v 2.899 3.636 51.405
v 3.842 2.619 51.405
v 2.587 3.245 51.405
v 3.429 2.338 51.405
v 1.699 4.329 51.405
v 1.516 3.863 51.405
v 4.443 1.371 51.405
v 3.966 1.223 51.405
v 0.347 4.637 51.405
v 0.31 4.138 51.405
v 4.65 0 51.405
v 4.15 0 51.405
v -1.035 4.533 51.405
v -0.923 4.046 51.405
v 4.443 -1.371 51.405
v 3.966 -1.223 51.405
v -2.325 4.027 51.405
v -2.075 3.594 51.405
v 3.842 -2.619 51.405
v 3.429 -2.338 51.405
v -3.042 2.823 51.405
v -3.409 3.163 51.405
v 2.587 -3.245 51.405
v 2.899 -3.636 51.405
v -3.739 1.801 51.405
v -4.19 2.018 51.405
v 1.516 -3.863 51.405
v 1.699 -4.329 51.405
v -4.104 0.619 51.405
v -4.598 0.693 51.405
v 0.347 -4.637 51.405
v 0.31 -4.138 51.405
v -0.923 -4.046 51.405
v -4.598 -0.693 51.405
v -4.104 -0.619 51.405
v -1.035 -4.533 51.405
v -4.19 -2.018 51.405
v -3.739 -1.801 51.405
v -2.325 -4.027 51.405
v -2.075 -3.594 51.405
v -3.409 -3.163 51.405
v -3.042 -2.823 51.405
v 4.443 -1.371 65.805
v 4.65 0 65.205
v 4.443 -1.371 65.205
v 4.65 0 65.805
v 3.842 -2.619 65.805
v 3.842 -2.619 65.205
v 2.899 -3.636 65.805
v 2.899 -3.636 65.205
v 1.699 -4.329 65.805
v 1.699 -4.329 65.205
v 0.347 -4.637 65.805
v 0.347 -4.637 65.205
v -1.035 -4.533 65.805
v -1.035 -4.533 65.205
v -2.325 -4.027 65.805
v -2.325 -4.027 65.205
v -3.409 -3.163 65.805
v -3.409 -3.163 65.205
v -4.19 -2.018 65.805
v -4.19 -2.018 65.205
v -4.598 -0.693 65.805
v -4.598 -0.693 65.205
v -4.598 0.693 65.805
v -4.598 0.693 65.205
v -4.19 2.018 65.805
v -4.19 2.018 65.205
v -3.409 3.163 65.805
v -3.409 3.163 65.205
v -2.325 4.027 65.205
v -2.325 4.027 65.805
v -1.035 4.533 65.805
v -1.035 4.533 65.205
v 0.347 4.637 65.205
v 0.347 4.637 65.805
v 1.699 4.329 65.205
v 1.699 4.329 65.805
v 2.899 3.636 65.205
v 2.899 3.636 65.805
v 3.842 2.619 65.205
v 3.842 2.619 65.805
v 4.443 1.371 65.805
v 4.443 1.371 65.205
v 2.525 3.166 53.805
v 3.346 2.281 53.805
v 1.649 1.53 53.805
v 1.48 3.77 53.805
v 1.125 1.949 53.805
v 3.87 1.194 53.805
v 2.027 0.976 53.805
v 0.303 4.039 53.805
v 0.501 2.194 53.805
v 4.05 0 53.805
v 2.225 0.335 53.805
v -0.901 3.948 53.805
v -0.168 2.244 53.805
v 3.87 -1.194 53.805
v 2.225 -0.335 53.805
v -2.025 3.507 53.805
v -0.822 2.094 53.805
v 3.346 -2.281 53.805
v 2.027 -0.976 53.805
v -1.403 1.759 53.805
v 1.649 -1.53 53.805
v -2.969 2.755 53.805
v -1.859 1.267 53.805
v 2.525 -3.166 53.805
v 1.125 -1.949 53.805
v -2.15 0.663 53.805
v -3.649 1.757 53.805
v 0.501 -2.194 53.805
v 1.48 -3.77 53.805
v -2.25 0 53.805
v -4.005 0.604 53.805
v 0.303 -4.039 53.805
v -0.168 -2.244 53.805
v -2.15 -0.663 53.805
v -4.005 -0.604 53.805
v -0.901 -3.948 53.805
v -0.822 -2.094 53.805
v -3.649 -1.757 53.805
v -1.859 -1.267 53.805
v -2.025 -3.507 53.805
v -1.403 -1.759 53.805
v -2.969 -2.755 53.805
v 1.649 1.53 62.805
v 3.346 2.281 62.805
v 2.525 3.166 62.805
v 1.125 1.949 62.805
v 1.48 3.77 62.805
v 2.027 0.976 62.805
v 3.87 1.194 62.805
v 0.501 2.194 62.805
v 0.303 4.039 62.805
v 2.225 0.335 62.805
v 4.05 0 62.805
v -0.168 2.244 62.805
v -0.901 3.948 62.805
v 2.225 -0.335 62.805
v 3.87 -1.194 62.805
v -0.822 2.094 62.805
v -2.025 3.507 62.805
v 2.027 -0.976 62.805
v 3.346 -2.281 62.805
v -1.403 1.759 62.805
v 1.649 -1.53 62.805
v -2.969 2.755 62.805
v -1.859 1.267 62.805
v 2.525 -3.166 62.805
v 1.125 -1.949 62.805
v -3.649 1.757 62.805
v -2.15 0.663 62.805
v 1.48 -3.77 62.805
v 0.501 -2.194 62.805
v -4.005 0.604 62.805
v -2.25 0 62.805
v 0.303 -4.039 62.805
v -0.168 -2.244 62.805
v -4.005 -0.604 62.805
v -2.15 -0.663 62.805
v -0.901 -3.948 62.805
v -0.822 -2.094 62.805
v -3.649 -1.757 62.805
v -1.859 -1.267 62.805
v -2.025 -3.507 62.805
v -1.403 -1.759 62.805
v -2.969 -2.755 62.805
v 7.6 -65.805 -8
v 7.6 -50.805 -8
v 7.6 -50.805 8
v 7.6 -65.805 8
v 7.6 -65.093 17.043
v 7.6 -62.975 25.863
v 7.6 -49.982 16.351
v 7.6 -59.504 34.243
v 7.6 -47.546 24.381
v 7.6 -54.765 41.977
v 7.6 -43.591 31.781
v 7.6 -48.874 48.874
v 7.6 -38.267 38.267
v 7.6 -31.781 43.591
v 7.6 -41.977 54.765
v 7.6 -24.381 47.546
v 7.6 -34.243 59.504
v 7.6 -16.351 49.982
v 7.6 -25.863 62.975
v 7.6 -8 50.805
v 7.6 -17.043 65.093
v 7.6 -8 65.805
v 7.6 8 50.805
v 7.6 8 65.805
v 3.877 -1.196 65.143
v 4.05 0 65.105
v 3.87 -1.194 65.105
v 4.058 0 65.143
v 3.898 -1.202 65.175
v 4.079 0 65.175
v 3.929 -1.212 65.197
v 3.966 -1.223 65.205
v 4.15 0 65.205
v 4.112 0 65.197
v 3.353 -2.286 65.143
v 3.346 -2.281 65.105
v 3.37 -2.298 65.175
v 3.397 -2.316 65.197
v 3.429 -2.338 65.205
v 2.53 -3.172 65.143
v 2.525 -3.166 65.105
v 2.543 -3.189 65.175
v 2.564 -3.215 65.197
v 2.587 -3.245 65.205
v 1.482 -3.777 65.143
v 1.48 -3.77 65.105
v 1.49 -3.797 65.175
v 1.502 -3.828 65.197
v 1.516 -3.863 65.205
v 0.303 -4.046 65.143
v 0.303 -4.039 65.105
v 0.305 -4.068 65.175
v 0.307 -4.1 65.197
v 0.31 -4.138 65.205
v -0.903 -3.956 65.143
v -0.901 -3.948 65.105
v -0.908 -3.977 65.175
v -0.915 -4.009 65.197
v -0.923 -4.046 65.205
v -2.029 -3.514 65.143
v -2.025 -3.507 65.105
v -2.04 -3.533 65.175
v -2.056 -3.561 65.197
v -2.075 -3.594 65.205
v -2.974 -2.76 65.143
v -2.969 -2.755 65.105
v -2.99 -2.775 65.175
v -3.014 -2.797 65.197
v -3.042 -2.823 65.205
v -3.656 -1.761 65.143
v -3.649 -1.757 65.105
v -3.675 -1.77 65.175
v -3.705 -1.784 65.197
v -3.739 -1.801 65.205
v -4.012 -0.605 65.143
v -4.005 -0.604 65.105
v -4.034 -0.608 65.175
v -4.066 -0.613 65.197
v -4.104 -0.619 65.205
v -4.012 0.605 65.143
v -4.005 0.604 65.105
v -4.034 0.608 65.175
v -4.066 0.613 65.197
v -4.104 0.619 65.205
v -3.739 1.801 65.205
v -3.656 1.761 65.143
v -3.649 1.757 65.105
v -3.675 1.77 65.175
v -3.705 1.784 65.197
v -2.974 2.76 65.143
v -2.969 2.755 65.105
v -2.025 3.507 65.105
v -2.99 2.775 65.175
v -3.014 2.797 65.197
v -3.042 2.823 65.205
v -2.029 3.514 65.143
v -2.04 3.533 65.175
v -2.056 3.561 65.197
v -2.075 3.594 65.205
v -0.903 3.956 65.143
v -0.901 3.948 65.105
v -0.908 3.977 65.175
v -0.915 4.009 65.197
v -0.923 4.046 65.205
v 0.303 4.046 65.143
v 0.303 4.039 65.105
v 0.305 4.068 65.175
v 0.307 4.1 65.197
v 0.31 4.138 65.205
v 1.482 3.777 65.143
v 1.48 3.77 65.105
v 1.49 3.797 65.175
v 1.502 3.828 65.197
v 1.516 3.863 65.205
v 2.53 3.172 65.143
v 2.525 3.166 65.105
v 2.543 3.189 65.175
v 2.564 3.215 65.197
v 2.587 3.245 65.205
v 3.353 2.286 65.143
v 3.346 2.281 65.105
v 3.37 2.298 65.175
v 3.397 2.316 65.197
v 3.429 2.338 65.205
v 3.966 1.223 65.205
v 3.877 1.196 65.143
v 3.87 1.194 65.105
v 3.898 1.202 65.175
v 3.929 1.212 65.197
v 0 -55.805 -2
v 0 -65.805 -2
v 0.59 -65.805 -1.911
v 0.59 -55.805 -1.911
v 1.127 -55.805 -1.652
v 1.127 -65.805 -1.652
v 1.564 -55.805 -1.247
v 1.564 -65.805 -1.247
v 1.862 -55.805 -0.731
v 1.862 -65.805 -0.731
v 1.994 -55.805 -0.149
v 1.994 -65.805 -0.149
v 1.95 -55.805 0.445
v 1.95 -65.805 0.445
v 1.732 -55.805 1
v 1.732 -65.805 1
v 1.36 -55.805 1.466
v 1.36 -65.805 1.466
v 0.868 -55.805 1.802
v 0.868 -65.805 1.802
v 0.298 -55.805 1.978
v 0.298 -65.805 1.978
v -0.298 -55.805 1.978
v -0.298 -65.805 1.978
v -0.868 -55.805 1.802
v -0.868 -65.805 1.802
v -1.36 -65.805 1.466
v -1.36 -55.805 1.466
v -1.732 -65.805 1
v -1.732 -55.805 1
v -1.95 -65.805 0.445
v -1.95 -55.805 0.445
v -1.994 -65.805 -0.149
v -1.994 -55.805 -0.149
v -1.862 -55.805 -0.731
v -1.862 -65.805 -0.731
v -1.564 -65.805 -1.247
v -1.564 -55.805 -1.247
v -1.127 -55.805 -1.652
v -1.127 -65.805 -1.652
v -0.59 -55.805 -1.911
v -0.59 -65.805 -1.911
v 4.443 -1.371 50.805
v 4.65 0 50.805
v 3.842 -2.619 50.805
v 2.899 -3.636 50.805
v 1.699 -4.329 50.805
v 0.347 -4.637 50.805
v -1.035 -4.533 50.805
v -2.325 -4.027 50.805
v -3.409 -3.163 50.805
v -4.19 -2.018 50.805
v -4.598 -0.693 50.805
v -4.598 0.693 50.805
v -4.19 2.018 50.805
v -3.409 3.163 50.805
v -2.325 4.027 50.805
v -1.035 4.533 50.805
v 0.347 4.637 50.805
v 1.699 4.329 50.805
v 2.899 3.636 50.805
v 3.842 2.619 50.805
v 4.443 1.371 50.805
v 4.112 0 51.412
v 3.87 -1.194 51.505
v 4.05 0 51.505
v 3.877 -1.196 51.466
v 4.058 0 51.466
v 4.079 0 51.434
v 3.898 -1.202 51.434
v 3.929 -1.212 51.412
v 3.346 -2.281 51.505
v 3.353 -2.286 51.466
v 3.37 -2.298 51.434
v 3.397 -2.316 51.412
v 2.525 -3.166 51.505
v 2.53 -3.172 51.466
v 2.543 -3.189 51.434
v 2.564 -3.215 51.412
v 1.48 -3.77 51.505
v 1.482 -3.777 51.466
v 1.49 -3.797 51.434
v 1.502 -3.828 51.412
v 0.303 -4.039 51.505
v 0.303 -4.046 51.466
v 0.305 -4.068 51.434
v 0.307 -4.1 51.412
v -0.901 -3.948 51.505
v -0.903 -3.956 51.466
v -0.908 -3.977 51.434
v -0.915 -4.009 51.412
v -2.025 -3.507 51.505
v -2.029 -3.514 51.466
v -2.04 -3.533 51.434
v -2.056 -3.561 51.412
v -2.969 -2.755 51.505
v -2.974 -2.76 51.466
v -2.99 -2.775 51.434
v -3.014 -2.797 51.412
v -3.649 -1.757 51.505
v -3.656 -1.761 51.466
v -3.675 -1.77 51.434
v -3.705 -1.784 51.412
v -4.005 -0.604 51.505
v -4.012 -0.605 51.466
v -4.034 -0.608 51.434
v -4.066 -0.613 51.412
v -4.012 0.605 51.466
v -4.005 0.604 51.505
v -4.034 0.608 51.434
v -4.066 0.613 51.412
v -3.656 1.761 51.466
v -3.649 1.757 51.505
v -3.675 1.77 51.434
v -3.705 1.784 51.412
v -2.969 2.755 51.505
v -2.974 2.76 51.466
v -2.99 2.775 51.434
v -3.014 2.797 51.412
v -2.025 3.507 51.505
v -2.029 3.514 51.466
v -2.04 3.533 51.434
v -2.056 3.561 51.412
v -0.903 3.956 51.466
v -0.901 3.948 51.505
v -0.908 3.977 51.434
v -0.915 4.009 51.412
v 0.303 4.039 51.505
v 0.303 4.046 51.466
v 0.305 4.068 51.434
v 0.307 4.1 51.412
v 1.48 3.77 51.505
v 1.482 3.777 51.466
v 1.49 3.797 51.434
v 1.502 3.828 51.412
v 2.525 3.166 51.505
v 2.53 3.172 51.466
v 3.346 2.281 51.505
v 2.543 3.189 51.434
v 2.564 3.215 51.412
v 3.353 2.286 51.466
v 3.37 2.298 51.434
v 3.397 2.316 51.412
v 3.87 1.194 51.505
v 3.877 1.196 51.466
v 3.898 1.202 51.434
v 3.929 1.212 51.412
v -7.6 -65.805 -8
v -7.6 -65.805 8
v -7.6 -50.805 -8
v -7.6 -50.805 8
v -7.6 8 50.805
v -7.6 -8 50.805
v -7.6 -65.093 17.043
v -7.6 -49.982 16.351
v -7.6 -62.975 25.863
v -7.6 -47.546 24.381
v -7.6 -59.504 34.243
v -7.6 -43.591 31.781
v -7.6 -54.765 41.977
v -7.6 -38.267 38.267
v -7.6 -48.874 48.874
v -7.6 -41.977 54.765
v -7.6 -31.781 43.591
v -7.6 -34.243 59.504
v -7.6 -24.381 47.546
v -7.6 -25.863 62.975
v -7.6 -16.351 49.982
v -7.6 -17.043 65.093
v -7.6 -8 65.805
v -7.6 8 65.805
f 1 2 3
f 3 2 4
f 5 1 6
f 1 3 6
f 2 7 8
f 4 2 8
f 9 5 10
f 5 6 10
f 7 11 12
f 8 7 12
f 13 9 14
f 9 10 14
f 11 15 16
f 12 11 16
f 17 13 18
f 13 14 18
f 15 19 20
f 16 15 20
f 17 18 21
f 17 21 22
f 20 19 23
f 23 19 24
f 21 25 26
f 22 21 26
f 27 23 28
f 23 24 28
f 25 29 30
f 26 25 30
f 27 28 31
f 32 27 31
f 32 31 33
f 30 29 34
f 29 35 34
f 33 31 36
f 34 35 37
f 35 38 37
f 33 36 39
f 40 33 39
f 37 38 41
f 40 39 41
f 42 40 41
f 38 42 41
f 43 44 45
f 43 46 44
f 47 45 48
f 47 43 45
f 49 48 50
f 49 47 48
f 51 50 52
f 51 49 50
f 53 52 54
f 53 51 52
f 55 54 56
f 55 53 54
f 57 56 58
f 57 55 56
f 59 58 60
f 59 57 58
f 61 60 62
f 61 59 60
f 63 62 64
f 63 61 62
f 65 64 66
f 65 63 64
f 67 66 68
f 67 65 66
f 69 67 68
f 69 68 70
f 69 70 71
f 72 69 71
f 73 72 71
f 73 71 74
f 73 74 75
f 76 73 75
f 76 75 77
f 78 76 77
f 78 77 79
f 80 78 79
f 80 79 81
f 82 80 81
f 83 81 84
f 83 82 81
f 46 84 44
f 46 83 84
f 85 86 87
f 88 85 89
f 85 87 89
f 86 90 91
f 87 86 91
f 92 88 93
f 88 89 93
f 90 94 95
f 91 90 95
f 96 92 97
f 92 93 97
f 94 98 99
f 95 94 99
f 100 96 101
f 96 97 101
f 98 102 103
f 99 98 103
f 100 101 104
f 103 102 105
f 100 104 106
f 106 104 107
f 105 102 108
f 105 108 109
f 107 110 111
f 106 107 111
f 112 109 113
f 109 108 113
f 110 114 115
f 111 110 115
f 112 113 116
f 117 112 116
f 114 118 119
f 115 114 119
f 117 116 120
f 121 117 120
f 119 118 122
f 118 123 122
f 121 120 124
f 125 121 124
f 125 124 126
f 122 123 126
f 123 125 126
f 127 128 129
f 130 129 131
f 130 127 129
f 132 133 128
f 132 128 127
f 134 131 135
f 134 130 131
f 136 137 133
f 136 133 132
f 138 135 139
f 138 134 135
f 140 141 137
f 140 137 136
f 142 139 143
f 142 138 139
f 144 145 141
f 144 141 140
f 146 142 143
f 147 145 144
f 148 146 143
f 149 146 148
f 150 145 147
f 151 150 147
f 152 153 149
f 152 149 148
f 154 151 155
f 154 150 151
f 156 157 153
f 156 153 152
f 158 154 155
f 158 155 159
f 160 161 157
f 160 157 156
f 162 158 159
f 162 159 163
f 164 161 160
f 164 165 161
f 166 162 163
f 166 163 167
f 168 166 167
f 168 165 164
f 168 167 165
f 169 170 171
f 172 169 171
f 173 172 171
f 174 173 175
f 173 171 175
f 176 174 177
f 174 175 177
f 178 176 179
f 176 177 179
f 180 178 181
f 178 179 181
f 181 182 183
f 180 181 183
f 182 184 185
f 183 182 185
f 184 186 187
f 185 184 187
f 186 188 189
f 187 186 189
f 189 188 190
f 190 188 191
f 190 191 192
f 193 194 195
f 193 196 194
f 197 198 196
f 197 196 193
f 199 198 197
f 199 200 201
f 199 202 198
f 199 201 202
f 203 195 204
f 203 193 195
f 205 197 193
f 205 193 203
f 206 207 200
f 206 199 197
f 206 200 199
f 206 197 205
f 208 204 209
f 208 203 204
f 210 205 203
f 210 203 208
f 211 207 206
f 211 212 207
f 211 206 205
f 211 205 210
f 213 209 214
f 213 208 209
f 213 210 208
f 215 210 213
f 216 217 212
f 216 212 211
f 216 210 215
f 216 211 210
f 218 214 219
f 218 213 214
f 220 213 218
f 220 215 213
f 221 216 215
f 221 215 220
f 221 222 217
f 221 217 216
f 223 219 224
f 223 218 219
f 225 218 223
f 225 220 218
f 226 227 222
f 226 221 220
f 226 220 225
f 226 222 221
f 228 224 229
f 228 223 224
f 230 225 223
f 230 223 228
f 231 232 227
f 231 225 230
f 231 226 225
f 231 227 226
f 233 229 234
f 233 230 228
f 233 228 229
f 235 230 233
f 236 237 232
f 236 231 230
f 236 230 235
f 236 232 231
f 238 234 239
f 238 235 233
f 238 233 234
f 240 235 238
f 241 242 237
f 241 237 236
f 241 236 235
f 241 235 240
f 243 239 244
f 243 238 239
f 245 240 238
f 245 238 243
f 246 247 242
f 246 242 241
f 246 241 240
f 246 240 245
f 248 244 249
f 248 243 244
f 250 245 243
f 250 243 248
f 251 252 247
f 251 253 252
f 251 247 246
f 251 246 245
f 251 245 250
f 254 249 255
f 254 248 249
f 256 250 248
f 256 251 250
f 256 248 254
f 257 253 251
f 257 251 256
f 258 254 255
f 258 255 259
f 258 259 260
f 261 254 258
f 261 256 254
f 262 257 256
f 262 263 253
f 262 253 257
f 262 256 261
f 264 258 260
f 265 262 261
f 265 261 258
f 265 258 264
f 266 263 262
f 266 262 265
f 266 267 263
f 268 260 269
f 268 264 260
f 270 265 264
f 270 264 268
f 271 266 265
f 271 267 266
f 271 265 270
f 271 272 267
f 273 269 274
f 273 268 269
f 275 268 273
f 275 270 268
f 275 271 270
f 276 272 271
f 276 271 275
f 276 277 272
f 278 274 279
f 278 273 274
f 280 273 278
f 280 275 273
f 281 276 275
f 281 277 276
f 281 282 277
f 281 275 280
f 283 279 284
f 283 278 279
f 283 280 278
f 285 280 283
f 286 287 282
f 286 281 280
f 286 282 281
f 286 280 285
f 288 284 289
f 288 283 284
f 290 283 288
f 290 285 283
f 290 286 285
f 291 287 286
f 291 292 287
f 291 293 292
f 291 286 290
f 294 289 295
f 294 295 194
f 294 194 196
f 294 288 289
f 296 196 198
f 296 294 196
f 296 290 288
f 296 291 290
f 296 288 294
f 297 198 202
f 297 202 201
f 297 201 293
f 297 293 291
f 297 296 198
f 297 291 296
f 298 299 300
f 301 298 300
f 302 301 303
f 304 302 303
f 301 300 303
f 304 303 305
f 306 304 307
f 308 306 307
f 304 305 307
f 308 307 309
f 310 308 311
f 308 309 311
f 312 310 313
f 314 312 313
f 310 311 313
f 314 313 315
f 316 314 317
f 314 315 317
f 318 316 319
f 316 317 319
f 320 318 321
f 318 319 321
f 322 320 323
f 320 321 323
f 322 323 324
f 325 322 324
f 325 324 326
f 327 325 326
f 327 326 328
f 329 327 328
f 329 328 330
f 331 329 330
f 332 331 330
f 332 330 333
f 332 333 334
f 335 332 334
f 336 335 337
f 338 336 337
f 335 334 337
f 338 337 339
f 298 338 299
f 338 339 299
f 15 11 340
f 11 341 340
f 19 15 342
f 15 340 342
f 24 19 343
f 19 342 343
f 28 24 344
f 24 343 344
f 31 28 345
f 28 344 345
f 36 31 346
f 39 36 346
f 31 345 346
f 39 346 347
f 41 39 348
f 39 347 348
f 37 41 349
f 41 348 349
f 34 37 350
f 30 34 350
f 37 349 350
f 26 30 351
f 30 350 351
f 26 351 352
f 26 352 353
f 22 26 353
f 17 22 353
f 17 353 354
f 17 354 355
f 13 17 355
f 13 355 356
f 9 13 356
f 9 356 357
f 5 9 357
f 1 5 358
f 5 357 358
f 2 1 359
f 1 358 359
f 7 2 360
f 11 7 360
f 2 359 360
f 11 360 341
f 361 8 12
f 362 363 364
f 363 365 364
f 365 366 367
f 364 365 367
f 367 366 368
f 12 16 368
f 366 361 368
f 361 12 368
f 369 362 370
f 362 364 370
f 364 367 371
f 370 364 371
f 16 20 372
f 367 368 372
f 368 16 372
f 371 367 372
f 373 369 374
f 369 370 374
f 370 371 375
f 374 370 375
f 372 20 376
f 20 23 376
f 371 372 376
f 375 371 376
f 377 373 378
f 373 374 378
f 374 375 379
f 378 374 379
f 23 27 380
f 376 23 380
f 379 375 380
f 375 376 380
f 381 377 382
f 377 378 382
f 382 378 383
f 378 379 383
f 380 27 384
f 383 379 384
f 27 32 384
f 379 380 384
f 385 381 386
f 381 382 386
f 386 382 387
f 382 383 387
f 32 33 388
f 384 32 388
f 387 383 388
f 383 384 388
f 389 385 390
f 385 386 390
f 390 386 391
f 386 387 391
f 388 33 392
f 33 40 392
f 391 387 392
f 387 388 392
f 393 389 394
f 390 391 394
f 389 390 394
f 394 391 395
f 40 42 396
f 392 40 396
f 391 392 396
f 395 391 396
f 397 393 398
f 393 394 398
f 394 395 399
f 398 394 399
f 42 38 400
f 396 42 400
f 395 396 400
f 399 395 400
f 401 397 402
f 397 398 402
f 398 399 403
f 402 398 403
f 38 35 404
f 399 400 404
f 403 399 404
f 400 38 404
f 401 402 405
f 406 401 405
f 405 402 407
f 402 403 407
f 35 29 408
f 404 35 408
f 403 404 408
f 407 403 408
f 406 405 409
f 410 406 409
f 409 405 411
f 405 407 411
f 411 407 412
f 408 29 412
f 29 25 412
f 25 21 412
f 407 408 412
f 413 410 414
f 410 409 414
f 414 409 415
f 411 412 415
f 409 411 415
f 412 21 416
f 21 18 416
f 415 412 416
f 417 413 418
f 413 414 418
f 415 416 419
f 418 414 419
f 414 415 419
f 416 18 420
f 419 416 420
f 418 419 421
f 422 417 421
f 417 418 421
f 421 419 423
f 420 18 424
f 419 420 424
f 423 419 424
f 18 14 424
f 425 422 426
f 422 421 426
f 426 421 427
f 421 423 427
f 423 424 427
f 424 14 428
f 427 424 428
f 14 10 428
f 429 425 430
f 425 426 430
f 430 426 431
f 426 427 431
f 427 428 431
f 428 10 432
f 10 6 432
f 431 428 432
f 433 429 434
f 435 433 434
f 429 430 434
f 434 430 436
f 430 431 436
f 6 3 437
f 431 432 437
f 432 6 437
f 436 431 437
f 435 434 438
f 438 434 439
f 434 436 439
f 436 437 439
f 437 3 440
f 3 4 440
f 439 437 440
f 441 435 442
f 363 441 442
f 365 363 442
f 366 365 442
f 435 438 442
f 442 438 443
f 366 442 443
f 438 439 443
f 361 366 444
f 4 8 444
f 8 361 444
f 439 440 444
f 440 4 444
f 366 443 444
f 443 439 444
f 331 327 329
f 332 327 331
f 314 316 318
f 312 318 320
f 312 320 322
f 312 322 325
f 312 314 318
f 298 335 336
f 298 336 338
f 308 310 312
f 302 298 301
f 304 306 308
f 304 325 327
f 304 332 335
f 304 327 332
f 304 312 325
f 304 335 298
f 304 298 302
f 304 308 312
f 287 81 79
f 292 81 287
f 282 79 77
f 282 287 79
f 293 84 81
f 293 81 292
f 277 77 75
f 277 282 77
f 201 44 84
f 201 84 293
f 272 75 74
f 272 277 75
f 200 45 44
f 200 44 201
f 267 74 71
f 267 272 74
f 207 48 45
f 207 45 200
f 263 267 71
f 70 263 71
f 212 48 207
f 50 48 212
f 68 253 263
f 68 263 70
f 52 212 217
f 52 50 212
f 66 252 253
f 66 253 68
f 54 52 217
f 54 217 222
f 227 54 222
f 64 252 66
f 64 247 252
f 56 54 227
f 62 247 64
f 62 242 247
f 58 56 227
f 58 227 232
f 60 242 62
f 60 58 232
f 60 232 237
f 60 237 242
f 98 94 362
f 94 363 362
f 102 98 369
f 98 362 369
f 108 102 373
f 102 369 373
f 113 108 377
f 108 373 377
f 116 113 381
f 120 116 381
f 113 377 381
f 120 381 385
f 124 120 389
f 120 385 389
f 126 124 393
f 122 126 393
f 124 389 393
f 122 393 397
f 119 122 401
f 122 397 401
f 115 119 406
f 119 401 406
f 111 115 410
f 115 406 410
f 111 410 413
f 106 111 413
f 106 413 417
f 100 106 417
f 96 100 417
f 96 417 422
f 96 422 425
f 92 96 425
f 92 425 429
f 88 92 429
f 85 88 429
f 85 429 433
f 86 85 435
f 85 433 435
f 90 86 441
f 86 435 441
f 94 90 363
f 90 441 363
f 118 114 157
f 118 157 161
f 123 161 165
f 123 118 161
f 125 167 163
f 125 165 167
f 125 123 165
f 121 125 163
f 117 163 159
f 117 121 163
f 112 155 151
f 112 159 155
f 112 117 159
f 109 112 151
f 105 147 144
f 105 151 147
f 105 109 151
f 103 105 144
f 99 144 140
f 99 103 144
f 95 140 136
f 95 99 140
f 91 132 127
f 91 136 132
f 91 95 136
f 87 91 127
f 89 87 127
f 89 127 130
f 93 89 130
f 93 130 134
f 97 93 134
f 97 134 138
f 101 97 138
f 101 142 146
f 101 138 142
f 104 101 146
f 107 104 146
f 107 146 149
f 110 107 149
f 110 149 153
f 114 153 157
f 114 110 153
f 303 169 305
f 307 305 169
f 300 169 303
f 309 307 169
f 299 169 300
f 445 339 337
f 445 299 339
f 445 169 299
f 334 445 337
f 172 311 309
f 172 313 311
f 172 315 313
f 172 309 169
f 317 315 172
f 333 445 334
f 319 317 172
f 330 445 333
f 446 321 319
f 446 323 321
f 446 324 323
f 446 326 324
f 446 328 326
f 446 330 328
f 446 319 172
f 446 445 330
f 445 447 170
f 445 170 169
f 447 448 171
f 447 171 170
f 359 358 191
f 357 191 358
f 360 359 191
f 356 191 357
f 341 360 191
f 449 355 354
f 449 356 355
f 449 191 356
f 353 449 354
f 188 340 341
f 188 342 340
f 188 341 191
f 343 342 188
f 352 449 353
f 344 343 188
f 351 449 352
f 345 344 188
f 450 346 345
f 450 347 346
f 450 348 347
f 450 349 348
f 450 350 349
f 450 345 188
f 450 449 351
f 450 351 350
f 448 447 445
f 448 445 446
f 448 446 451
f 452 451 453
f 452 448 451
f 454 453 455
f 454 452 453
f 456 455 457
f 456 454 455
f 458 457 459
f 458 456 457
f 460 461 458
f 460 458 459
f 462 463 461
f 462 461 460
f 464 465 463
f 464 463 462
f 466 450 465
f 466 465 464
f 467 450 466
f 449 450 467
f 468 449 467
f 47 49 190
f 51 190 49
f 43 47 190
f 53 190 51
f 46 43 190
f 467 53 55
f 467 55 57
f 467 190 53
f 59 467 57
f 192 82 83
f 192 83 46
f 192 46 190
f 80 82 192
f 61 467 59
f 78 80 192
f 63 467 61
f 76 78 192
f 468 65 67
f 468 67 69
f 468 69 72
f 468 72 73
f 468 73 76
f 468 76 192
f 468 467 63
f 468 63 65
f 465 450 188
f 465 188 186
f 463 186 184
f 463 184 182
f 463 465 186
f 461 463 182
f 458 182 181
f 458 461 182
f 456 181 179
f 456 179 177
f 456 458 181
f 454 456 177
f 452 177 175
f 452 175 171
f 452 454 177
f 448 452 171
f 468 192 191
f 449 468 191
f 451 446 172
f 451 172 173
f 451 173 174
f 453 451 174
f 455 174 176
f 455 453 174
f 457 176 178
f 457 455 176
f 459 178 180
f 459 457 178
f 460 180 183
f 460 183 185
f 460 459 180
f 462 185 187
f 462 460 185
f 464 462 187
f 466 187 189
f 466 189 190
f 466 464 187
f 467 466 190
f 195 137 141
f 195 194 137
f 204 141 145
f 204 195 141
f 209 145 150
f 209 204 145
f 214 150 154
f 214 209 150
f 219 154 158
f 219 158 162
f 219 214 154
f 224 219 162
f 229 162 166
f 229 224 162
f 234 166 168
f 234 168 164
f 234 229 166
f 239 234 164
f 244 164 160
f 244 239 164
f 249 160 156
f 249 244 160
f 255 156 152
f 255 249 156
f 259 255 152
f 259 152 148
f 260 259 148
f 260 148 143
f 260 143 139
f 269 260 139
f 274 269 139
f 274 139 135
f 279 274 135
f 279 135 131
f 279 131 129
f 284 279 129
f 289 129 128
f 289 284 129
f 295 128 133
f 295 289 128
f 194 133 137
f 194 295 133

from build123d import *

# Parameters (mm, degrees)
BOSS_EXTRUDE1_DEPTH      = 7.6
BOSS_EXTRUDE1_DEPTH_BACK = 7.6
SKETCH7_R                = 2.25
CUT_EXTRUDE1_DEPTH       = 94.371547498
SKETCH15_R               = 2
CUT_EXTRUDE11_DEPTH      = 10


with BuildPart() as part:
    # Sketch5 → Boss-Extrude1 (new, two sides: drawn at the far end of the back side and taken through both)
    with BuildSketch(Plane(origin=(0, 0, 0), x_dir=(0, 0, -1), z_dir=(1, 0, 0)).offset(-BOSS_EXTRUDE1_DEPTH_BACK)):
        with BuildLine():
            Line((-50.80458146, 8), (-50.80458146, 0))
            Line((-50.80458146, 0), (-50.80458146, -8))
            ThreePointArc((-50.80458146, -8), (-38.267409816, -38.267409816), (-8, -50.80458146))
            Line((-8, -50.80458146), (0, -50.80458146))
            Line((0, -50.80458146), (8, -50.80458146))
            Line((8, -50.80458146), (8, -65.80458146))
            Line((8, -65.80458146), (-8, -65.80458146))
            ThreePointArc((-8, -65.80458146), (-48.874011534, -48.874011534), (-65.80458146, -8))
            Line((-65.80458146, -8), (-65.80458146, 8))
            Line((-65.80458146, 8), (-50.80458146, 8))
        make_face()
    extrude(amount=BOSS_EXTRUDE1_DEPTH + BOSS_EXTRUDE1_DEPTH_BACK)

    # Sketch7 → Cut-Extrude1 (cut, through all)
    with BuildSketch(Plane.XY):
        Circle(SKETCH7_R)
    extrude(amount=CUT_EXTRUDE1_DEPTH, mode=Mode.SUBTRACT)

    # Sketch15 → Cut-Extrude11 (cut)
    with BuildSketch(Plane.XZ.offset(65.80458146)):
        Circle(SKETCH15_R)
    extrude(amount=-CUT_EXTRUDE11_DEPTH, mode=Mode.SUBTRACT)

    # Sketch18 → Cut-Revolve1 (revolve, cut)
    with BuildSketch(Plane(origin=(0, 0, 0), x_dir=(0, 0, -1), z_dir=(1, 0, 0))):
        with BuildLine():
            Line((-65.80458146, 4.65), (-65.80458146, 0))
            Line((-65.80458146, 0), (-62.80458146, 0))
            Line((-62.80458146, 0), (-62.80458146, 4.05))
            Line((-62.80458146, 4.05), (-65.10458146, 4.05))
            ThreePointArc((-65.10458146, 4.05), (-65.175292138, 4.079289322), (-65.20458146, 4.15))
            Line((-65.20458146, 4.15), (-65.20458146, 4.65))
            Line((-65.20458146, 4.65), (-65.80458146, 4.65))
        make_face()
        with BuildLine():
            Line((-51.40458146, 4.65), (-50.80458146, 4.65))
            Line((-50.80458146, 4.65), (-50.80458146, 0))
            Line((-50.80458146, 0), (-53.80458146, 0))
            Line((-53.80458146, 0), (-53.80458146, 4.05))
            Line((-53.80458146, 4.05), (-51.50458146, 4.05))
            ThreePointArc((-51.50458146, 4.05), (-51.433870782, 4.079289322), (-51.40458146, 4.15))
            Line((-51.40458146, 4.15), (-51.40458146, 4.65))
        make_face()
    revolve(axis=Axis((0, 0, 109.558527697), (0, 0, -1)), mode=Mode.SUBTRACT)


solid = part.part
